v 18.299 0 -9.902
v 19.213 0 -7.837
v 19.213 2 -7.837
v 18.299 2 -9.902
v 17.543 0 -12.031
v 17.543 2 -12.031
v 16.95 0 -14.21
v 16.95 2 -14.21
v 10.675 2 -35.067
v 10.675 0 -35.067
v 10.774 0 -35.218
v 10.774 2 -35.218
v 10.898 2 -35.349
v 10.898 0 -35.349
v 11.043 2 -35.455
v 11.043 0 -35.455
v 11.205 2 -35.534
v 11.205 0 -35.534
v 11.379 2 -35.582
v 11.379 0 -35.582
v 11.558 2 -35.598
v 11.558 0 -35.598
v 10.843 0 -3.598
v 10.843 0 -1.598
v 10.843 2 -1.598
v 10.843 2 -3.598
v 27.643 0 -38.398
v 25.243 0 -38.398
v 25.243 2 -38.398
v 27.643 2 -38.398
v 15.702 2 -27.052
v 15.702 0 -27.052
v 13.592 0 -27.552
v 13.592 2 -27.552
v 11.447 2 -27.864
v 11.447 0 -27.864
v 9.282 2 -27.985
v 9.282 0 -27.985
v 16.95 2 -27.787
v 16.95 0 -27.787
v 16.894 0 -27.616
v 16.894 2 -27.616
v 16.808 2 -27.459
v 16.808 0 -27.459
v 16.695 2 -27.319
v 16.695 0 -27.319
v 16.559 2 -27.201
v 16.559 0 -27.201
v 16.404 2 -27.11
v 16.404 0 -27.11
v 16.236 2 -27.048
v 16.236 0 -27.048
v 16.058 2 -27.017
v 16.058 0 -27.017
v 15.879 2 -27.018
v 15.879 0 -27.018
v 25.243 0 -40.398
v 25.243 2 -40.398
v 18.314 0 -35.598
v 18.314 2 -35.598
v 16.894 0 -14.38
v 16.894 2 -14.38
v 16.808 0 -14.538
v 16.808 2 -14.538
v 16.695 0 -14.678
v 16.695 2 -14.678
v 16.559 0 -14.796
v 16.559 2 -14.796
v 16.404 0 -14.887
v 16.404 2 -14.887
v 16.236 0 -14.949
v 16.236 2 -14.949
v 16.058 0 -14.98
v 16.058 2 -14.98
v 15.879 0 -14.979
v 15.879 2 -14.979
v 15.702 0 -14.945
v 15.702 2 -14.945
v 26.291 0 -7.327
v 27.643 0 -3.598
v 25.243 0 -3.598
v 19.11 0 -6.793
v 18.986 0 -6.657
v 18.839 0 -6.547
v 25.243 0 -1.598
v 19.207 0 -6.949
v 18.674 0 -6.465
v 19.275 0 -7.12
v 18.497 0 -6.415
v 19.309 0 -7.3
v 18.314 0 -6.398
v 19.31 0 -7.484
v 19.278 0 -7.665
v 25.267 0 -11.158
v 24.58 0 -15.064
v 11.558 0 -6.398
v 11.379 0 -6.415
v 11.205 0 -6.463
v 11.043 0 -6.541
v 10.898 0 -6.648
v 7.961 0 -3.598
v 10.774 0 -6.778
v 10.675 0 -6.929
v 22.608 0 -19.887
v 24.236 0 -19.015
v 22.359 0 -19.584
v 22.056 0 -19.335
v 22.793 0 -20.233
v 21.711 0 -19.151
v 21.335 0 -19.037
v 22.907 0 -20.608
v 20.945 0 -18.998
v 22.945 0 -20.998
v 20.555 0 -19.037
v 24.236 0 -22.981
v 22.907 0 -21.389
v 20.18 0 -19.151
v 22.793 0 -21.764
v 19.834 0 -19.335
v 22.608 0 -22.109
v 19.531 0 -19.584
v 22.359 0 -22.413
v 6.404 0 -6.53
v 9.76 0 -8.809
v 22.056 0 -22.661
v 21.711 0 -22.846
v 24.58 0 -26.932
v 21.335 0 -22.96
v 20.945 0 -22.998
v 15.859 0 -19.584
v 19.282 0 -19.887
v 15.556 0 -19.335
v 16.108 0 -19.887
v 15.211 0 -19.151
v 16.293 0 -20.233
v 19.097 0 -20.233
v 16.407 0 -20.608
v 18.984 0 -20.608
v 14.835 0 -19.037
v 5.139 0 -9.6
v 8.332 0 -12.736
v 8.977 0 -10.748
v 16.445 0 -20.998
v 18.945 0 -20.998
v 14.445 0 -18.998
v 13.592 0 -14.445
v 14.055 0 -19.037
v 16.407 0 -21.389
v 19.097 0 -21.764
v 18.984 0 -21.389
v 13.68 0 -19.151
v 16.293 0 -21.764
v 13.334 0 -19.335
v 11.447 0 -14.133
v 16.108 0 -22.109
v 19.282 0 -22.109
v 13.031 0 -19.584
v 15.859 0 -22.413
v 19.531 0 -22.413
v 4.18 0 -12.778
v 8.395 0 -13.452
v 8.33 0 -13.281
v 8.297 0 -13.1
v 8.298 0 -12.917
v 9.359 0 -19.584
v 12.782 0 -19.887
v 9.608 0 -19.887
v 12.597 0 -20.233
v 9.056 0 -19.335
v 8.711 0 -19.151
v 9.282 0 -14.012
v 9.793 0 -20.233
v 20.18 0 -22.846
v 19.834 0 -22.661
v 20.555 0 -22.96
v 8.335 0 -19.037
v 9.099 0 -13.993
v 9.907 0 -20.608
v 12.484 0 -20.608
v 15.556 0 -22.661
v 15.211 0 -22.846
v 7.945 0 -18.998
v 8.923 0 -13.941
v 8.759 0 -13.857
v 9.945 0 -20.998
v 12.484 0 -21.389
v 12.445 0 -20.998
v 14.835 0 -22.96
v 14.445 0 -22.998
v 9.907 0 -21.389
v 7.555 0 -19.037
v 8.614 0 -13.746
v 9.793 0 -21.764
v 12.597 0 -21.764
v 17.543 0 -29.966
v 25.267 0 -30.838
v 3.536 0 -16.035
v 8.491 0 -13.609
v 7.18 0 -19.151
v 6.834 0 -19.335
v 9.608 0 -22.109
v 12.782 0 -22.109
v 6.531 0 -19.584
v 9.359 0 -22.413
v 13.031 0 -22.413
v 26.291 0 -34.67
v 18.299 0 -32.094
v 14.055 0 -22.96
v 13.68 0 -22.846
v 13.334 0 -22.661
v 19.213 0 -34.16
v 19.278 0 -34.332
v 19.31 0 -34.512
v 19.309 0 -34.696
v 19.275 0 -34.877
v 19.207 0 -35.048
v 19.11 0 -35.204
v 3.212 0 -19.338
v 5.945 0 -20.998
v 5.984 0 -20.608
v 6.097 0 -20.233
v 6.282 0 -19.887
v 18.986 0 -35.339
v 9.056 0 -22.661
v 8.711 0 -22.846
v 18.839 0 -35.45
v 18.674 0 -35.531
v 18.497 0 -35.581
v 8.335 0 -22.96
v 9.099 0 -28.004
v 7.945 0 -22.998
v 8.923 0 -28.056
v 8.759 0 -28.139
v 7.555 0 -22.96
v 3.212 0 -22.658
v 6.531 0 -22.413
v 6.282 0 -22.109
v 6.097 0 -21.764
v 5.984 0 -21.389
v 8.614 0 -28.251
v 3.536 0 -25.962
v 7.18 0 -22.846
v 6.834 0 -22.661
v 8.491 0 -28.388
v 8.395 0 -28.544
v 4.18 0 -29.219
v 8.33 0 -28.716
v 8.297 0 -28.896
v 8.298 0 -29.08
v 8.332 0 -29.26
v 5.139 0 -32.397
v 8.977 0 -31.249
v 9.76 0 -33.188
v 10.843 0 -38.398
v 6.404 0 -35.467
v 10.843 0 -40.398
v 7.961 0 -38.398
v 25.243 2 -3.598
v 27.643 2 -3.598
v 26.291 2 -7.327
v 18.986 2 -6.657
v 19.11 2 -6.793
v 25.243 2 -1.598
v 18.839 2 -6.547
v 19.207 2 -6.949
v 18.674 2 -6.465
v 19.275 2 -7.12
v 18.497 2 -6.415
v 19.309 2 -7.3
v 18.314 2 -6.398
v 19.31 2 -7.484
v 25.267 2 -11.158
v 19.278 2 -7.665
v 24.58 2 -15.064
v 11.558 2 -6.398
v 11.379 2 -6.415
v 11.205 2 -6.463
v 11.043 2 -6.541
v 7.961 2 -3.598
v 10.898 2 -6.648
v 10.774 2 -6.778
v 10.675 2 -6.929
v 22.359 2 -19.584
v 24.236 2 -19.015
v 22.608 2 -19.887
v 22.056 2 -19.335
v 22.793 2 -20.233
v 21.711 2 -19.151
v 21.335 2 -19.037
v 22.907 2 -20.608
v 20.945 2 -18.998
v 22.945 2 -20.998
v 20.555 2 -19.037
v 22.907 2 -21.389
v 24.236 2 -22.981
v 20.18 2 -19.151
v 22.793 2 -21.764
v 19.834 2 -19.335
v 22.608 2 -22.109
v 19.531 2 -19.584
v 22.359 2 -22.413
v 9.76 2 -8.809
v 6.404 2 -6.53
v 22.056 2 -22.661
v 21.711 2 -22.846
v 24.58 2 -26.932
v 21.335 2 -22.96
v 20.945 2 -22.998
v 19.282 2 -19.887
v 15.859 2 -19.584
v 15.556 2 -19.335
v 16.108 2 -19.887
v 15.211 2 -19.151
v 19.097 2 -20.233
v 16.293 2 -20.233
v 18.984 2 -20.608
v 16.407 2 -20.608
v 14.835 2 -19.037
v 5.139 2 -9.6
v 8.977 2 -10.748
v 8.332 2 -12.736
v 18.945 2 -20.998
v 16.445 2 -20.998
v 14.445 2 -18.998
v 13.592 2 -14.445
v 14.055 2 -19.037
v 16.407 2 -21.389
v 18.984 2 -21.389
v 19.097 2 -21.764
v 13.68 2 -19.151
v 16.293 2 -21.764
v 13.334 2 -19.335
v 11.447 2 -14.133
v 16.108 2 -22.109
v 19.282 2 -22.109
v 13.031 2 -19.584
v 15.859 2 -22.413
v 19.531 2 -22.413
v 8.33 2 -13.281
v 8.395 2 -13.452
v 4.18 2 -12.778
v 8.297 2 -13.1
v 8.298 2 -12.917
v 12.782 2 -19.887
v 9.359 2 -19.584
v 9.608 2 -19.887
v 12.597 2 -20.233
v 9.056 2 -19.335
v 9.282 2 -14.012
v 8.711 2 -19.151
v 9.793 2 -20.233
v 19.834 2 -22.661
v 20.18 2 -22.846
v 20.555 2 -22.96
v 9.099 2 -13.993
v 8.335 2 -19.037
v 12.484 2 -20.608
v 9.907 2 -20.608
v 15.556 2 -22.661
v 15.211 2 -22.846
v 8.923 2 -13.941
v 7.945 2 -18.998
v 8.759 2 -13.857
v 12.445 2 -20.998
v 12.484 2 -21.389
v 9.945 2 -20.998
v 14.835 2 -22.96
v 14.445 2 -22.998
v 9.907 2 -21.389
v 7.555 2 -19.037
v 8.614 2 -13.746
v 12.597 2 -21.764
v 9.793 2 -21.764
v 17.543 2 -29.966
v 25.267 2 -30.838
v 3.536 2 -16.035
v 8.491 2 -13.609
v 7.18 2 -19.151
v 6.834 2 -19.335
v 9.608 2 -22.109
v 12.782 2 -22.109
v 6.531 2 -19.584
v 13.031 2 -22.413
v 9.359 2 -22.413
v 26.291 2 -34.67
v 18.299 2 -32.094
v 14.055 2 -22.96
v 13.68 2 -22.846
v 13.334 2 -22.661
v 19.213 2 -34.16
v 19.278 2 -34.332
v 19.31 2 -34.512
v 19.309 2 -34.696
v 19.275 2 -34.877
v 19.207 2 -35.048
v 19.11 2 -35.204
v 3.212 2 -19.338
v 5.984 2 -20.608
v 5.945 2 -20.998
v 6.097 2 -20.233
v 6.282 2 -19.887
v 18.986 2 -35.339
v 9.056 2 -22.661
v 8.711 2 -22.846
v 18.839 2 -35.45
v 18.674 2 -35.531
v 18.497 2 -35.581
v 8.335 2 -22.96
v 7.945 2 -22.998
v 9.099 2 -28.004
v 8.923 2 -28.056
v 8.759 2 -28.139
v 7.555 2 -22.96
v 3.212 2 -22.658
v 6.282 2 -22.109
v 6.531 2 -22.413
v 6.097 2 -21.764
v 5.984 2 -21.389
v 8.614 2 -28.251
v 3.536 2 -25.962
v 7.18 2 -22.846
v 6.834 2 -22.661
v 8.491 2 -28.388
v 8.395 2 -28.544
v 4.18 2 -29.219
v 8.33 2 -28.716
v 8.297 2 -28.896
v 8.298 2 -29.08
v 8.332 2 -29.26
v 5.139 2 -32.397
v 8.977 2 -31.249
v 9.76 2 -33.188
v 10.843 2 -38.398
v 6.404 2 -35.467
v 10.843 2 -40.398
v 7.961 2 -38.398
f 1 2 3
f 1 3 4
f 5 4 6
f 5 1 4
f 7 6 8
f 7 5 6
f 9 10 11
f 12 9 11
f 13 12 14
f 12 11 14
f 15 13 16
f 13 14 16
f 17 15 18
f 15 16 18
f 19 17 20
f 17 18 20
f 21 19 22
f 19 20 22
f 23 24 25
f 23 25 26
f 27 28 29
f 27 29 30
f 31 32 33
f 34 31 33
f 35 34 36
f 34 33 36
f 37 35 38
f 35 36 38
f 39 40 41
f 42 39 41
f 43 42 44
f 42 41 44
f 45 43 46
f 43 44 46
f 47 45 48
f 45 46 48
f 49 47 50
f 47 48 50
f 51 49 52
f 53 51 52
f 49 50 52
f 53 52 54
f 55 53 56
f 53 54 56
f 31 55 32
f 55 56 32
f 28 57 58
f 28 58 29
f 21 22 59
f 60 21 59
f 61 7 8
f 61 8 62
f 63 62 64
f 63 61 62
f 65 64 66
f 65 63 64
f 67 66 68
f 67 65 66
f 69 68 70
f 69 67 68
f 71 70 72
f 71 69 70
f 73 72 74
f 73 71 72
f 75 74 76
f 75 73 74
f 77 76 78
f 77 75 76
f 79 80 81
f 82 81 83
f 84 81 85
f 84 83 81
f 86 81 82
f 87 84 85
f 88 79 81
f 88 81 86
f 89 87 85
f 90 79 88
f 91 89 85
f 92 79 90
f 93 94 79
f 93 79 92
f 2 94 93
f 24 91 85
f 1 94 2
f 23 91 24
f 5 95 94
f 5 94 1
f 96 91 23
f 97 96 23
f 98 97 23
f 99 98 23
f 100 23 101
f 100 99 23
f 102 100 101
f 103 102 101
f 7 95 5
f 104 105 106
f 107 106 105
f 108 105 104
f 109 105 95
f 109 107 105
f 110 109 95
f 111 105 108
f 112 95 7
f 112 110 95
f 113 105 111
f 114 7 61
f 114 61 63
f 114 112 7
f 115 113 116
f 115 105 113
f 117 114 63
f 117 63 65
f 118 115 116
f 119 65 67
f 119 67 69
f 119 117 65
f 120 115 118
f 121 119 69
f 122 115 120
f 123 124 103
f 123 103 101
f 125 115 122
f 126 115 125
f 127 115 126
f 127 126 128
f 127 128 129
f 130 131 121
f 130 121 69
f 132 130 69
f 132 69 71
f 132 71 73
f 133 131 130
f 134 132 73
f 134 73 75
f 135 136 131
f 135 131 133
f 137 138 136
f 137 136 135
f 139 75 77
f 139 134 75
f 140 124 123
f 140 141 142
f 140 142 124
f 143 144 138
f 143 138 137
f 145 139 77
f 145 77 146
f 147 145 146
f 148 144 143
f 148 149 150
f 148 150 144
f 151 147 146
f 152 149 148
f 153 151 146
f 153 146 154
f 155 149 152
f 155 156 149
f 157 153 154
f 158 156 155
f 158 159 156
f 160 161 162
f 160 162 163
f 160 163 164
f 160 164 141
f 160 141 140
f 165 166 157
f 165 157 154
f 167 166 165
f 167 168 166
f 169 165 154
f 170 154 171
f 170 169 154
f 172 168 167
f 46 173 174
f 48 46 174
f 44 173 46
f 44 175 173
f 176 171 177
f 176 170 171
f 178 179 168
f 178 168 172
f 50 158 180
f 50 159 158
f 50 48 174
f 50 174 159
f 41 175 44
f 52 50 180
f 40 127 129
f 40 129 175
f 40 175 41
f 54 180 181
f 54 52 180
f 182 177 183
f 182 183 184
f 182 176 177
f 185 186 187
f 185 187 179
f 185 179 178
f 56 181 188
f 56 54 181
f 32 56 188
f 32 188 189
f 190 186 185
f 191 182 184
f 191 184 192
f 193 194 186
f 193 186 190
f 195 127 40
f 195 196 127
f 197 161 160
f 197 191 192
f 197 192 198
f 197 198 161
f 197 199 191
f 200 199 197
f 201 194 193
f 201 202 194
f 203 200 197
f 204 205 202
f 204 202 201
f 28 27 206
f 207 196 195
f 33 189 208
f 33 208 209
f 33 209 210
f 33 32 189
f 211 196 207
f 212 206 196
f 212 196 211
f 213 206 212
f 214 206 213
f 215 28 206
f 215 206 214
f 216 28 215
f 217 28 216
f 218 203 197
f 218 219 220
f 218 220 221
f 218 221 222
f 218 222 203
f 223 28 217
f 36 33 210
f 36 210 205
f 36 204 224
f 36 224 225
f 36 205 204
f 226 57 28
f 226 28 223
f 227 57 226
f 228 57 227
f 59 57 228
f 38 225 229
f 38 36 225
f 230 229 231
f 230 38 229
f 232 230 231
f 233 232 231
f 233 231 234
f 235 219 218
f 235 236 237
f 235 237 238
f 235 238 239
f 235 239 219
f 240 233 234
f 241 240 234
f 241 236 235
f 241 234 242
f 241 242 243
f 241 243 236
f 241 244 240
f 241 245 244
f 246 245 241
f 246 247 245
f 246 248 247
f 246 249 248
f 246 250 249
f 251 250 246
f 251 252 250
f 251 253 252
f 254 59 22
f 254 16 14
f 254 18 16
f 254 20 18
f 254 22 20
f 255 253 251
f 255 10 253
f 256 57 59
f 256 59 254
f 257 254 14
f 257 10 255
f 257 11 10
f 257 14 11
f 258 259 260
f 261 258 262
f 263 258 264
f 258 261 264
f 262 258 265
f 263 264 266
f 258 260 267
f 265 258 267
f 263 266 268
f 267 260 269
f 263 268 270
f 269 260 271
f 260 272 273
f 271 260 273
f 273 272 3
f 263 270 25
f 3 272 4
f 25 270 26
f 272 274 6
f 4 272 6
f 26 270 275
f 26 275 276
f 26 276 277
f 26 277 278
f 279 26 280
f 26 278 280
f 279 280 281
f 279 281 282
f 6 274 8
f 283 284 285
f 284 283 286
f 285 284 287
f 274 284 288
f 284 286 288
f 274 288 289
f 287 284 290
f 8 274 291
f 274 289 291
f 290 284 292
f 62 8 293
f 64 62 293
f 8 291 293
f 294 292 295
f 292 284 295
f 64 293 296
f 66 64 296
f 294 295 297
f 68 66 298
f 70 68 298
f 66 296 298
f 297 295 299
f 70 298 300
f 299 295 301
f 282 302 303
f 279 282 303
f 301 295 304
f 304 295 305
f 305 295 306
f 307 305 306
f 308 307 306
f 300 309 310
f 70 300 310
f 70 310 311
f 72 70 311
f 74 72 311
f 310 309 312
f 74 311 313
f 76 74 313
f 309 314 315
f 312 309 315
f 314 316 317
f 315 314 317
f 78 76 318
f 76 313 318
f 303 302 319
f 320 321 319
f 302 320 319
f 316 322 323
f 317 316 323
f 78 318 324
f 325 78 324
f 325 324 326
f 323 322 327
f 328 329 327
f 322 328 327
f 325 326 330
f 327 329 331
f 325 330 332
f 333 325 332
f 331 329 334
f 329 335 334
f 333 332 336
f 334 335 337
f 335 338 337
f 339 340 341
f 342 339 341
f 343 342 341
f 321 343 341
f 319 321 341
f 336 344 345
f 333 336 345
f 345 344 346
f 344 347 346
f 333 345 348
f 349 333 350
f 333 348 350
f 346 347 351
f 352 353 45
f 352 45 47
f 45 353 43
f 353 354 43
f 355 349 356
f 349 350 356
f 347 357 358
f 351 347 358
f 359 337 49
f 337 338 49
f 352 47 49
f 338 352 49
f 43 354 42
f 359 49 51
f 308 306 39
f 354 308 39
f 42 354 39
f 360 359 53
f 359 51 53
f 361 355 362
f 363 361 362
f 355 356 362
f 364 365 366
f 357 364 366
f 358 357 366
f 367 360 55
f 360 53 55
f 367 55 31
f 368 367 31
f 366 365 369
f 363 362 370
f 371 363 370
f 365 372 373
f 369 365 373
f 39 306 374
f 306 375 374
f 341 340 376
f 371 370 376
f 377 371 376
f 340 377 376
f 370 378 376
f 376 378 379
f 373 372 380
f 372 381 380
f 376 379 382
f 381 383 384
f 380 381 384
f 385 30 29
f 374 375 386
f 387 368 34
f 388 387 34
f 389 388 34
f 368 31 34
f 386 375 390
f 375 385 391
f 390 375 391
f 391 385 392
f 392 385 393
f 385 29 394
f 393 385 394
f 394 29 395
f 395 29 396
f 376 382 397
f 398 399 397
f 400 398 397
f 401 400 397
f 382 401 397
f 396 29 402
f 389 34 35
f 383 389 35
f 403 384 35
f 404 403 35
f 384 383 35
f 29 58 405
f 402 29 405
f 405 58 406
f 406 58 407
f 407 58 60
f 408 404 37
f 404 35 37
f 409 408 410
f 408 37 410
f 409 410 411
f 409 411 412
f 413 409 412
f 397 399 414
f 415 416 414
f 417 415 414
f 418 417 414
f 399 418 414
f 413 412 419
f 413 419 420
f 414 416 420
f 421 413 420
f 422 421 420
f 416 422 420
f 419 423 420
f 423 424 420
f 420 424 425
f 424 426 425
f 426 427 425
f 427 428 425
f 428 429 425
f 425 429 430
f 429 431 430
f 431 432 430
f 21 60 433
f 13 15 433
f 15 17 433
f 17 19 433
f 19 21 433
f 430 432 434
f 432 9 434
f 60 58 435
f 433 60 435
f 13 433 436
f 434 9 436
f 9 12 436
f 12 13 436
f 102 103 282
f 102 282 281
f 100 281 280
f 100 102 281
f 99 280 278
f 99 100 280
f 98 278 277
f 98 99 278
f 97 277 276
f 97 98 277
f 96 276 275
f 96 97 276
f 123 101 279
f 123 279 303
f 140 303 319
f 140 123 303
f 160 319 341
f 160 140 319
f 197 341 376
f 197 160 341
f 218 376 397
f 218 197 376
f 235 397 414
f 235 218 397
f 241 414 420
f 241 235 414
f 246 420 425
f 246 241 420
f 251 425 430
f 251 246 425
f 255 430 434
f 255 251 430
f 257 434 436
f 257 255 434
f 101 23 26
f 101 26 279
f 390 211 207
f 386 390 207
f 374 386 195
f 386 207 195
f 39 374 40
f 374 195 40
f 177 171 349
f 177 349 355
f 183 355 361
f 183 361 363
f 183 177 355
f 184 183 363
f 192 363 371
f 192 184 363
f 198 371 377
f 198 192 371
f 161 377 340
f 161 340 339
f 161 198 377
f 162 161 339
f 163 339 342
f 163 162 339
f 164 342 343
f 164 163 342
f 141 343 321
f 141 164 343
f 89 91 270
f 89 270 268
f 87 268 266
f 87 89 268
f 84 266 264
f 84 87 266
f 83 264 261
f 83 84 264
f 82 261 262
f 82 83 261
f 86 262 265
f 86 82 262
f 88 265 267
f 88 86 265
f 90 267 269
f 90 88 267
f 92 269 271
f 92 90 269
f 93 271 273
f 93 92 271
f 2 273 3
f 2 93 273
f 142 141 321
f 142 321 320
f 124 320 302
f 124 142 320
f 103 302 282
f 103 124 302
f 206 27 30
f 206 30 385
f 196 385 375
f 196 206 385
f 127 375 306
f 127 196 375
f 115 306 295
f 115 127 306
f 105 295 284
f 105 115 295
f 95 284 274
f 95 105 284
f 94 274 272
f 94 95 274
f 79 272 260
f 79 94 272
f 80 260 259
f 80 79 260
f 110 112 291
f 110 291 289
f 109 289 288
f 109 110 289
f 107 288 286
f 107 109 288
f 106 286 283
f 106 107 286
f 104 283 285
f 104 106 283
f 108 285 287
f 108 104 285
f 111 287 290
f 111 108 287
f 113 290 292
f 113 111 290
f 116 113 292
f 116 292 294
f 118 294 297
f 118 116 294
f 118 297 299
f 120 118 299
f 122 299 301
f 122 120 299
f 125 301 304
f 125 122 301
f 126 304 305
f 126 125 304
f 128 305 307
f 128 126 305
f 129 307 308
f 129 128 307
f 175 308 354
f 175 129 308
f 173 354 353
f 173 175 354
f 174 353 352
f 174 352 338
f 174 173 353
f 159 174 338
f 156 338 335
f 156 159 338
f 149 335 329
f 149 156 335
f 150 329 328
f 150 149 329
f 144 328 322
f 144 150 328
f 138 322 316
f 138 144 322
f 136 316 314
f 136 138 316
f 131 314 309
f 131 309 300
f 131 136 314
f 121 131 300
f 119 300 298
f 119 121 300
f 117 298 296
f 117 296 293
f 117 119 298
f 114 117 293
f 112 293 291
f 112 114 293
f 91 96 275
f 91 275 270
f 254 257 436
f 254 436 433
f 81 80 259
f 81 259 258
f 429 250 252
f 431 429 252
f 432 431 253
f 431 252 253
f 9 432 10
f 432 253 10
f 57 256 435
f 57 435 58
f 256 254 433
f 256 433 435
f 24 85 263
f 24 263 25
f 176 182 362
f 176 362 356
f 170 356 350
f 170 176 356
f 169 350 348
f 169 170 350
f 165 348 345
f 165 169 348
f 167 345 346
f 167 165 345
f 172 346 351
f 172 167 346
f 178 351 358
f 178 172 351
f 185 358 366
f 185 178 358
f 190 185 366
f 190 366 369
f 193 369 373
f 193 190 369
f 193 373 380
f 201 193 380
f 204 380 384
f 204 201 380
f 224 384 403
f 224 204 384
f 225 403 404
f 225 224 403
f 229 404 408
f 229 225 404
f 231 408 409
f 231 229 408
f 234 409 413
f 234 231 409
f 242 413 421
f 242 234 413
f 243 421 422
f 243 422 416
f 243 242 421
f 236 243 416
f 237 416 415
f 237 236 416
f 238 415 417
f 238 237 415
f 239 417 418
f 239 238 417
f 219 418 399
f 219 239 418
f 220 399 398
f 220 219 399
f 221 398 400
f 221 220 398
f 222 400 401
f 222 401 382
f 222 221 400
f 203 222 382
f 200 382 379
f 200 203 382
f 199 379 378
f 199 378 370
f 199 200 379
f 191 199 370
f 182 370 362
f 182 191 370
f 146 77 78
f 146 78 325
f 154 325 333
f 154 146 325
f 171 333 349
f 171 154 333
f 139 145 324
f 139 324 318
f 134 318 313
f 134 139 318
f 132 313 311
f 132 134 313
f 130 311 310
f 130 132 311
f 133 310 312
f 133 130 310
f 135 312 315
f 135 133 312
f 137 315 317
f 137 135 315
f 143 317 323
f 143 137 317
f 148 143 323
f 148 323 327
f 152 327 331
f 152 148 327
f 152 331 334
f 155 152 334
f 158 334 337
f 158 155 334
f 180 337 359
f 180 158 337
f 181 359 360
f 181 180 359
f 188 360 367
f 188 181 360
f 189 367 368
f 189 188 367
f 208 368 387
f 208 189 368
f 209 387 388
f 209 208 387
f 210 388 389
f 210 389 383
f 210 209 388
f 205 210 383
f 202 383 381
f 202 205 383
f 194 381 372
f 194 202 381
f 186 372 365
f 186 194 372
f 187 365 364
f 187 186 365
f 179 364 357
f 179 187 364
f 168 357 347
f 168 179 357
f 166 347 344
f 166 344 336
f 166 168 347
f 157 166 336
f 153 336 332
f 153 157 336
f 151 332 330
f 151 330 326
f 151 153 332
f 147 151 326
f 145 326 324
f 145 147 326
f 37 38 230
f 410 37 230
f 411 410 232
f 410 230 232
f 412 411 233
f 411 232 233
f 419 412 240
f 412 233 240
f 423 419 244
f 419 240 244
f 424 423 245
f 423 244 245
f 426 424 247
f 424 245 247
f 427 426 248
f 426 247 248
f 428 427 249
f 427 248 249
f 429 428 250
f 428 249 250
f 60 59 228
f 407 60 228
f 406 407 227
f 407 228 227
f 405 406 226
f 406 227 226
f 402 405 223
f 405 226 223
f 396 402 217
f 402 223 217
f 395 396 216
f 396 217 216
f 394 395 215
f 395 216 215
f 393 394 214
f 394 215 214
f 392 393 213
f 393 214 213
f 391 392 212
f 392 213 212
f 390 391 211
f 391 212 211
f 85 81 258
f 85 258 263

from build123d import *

# Parameters (mm, degrees)
SKETCH2_R           = 2
BOSS_EXTRUDE1_DEPTH = 2


with BuildPart() as part:
    # Sketch2 → Boss-Extrude1 (new body)
    with BuildSketch(Plane(origin=(0, 0, 0), x_dir=(1, 0, 0), z_dir=(0, 1, 0))):
        with BuildLine():
            Line((7.961413572, 38.398358915), (10.842933693, 38.398358915))
            Line((10.842933693, 38.398358915), (10.842933693, 40.398358915))
            Line((10.842933693, 40.398358915), (25.242933693, 40.398358915))
            Line((25.242933693, 40.398358915), (25.242933693, 38.398358915))
            Line((25.242933693, 38.398358915), (27.643012608, 38.398358915))
            ThreePointArc((27.643012608, 38.398358915), (24.192745703, 20.998358915), (27.643012608, 3.598358915))
            Line((27.643012608, 3.598358915), (25.242933693, 3.598358915))
            Line((25.242933693, 3.598358915), (25.242933693, 1.598358915))
            Line((25.242933693, 1.598358915), (10.842933693, 1.598358915))
            Line((10.842933693, 1.598358915), (10.842933693, 3.598358915))
            Line((10.842933693, 3.598358915), (7.961413572, 3.598358915))
            ThreePointArc((7.961413572, 3.598358915), (3.171685738, 20.998358915), (7.961413572, 38.398358915))
        make_face()
        with Locations(Location((14.44517784, 20.998358915, 0), (0, 0, 270))):
            Circle(SKETCH2_R, mode=Mode.SUBTRACT)
        with Locations(Location((7.94517784, 20.998358915, 0), (0, 0, 270))):
            Circle(SKETCH2_R, mode=Mode.SUBTRACT)
        with Locations(Location((20.94517784, 20.998358915, 0), (0, 0, 270))):
            Circle(SKETCH2_R, mode=Mode.SUBTRACT)
        with BuildLine():
            Line((11.558407931, 6.398358915), (18.314191235, 6.398358915))
            ThreePointArc((18.314191235, 6.398358915), (19.162339122, 6.868599384), (19.21282009, 7.837068593))
            ThreePointArc((19.21282009, 7.837068593), (17.901234233, 10.95935639), (16.949906233, 14.209573857))
            ThreePointArc((16.949906233, 14.209573857), (16.483665754, 14.844744909), (15.702159941, 14.945099841))
            ThreePointArc((15.702159941, 14.945099841), (12.522935582, 14.264828801), (9.281614764, 14.011697267))
            ThreePointArc((9.281614764, 14.011697267), (8.491111108, 13.609072345), (8.331792637, 12.73636364))
            ThreePointArc((8.331792637, 12.73636364), (9.351564099, 9.771568101), (10.675191455, 6.929393398))
            ThreePointArc((10.675191455, 6.929393398), (11.04312428, 6.54133922), (11.558407931, 6.398358915))
        make_face(mode=Mode.SUBTRACT)
        with BuildLine():
            Line((11.558407931, 35.598358915), (18.314191235, 35.598358915))
            ThreePointArc((18.314191235, 35.598358915), (19.162339122, 35.128118447), (19.21282009, 34.159649238))
            ThreePointArc((19.21282009, 34.159649238), (17.901234233, 31.03736144), (16.949906233, 27.787143973))
            ThreePointArc((16.949906233, 27.787143973), (16.483665754, 27.151972922), (15.702159941, 27.05161799))
            ThreePointArc((15.702159941, 27.05161799), (12.522935582, 27.73188903), (9.281614764, 27.985020563))
            ThreePointArc((9.281614764, 27.985020563), (8.491111108, 28.387645486), (8.331792637, 29.26035419))
            ThreePointArc((8.331792637, 29.26035419), (9.351564099, 32.225149729), (10.675191455, 35.067324432))
            ThreePointArc((10.675191455, 35.067324432), (11.04312428, 35.455378611), (11.558407931, 35.598358915))
        make_face(mode=Mode.SUBTRACT)
    extrude(amount=BOSS_EXTRUDE1_DEPTH)


solid = part.part
